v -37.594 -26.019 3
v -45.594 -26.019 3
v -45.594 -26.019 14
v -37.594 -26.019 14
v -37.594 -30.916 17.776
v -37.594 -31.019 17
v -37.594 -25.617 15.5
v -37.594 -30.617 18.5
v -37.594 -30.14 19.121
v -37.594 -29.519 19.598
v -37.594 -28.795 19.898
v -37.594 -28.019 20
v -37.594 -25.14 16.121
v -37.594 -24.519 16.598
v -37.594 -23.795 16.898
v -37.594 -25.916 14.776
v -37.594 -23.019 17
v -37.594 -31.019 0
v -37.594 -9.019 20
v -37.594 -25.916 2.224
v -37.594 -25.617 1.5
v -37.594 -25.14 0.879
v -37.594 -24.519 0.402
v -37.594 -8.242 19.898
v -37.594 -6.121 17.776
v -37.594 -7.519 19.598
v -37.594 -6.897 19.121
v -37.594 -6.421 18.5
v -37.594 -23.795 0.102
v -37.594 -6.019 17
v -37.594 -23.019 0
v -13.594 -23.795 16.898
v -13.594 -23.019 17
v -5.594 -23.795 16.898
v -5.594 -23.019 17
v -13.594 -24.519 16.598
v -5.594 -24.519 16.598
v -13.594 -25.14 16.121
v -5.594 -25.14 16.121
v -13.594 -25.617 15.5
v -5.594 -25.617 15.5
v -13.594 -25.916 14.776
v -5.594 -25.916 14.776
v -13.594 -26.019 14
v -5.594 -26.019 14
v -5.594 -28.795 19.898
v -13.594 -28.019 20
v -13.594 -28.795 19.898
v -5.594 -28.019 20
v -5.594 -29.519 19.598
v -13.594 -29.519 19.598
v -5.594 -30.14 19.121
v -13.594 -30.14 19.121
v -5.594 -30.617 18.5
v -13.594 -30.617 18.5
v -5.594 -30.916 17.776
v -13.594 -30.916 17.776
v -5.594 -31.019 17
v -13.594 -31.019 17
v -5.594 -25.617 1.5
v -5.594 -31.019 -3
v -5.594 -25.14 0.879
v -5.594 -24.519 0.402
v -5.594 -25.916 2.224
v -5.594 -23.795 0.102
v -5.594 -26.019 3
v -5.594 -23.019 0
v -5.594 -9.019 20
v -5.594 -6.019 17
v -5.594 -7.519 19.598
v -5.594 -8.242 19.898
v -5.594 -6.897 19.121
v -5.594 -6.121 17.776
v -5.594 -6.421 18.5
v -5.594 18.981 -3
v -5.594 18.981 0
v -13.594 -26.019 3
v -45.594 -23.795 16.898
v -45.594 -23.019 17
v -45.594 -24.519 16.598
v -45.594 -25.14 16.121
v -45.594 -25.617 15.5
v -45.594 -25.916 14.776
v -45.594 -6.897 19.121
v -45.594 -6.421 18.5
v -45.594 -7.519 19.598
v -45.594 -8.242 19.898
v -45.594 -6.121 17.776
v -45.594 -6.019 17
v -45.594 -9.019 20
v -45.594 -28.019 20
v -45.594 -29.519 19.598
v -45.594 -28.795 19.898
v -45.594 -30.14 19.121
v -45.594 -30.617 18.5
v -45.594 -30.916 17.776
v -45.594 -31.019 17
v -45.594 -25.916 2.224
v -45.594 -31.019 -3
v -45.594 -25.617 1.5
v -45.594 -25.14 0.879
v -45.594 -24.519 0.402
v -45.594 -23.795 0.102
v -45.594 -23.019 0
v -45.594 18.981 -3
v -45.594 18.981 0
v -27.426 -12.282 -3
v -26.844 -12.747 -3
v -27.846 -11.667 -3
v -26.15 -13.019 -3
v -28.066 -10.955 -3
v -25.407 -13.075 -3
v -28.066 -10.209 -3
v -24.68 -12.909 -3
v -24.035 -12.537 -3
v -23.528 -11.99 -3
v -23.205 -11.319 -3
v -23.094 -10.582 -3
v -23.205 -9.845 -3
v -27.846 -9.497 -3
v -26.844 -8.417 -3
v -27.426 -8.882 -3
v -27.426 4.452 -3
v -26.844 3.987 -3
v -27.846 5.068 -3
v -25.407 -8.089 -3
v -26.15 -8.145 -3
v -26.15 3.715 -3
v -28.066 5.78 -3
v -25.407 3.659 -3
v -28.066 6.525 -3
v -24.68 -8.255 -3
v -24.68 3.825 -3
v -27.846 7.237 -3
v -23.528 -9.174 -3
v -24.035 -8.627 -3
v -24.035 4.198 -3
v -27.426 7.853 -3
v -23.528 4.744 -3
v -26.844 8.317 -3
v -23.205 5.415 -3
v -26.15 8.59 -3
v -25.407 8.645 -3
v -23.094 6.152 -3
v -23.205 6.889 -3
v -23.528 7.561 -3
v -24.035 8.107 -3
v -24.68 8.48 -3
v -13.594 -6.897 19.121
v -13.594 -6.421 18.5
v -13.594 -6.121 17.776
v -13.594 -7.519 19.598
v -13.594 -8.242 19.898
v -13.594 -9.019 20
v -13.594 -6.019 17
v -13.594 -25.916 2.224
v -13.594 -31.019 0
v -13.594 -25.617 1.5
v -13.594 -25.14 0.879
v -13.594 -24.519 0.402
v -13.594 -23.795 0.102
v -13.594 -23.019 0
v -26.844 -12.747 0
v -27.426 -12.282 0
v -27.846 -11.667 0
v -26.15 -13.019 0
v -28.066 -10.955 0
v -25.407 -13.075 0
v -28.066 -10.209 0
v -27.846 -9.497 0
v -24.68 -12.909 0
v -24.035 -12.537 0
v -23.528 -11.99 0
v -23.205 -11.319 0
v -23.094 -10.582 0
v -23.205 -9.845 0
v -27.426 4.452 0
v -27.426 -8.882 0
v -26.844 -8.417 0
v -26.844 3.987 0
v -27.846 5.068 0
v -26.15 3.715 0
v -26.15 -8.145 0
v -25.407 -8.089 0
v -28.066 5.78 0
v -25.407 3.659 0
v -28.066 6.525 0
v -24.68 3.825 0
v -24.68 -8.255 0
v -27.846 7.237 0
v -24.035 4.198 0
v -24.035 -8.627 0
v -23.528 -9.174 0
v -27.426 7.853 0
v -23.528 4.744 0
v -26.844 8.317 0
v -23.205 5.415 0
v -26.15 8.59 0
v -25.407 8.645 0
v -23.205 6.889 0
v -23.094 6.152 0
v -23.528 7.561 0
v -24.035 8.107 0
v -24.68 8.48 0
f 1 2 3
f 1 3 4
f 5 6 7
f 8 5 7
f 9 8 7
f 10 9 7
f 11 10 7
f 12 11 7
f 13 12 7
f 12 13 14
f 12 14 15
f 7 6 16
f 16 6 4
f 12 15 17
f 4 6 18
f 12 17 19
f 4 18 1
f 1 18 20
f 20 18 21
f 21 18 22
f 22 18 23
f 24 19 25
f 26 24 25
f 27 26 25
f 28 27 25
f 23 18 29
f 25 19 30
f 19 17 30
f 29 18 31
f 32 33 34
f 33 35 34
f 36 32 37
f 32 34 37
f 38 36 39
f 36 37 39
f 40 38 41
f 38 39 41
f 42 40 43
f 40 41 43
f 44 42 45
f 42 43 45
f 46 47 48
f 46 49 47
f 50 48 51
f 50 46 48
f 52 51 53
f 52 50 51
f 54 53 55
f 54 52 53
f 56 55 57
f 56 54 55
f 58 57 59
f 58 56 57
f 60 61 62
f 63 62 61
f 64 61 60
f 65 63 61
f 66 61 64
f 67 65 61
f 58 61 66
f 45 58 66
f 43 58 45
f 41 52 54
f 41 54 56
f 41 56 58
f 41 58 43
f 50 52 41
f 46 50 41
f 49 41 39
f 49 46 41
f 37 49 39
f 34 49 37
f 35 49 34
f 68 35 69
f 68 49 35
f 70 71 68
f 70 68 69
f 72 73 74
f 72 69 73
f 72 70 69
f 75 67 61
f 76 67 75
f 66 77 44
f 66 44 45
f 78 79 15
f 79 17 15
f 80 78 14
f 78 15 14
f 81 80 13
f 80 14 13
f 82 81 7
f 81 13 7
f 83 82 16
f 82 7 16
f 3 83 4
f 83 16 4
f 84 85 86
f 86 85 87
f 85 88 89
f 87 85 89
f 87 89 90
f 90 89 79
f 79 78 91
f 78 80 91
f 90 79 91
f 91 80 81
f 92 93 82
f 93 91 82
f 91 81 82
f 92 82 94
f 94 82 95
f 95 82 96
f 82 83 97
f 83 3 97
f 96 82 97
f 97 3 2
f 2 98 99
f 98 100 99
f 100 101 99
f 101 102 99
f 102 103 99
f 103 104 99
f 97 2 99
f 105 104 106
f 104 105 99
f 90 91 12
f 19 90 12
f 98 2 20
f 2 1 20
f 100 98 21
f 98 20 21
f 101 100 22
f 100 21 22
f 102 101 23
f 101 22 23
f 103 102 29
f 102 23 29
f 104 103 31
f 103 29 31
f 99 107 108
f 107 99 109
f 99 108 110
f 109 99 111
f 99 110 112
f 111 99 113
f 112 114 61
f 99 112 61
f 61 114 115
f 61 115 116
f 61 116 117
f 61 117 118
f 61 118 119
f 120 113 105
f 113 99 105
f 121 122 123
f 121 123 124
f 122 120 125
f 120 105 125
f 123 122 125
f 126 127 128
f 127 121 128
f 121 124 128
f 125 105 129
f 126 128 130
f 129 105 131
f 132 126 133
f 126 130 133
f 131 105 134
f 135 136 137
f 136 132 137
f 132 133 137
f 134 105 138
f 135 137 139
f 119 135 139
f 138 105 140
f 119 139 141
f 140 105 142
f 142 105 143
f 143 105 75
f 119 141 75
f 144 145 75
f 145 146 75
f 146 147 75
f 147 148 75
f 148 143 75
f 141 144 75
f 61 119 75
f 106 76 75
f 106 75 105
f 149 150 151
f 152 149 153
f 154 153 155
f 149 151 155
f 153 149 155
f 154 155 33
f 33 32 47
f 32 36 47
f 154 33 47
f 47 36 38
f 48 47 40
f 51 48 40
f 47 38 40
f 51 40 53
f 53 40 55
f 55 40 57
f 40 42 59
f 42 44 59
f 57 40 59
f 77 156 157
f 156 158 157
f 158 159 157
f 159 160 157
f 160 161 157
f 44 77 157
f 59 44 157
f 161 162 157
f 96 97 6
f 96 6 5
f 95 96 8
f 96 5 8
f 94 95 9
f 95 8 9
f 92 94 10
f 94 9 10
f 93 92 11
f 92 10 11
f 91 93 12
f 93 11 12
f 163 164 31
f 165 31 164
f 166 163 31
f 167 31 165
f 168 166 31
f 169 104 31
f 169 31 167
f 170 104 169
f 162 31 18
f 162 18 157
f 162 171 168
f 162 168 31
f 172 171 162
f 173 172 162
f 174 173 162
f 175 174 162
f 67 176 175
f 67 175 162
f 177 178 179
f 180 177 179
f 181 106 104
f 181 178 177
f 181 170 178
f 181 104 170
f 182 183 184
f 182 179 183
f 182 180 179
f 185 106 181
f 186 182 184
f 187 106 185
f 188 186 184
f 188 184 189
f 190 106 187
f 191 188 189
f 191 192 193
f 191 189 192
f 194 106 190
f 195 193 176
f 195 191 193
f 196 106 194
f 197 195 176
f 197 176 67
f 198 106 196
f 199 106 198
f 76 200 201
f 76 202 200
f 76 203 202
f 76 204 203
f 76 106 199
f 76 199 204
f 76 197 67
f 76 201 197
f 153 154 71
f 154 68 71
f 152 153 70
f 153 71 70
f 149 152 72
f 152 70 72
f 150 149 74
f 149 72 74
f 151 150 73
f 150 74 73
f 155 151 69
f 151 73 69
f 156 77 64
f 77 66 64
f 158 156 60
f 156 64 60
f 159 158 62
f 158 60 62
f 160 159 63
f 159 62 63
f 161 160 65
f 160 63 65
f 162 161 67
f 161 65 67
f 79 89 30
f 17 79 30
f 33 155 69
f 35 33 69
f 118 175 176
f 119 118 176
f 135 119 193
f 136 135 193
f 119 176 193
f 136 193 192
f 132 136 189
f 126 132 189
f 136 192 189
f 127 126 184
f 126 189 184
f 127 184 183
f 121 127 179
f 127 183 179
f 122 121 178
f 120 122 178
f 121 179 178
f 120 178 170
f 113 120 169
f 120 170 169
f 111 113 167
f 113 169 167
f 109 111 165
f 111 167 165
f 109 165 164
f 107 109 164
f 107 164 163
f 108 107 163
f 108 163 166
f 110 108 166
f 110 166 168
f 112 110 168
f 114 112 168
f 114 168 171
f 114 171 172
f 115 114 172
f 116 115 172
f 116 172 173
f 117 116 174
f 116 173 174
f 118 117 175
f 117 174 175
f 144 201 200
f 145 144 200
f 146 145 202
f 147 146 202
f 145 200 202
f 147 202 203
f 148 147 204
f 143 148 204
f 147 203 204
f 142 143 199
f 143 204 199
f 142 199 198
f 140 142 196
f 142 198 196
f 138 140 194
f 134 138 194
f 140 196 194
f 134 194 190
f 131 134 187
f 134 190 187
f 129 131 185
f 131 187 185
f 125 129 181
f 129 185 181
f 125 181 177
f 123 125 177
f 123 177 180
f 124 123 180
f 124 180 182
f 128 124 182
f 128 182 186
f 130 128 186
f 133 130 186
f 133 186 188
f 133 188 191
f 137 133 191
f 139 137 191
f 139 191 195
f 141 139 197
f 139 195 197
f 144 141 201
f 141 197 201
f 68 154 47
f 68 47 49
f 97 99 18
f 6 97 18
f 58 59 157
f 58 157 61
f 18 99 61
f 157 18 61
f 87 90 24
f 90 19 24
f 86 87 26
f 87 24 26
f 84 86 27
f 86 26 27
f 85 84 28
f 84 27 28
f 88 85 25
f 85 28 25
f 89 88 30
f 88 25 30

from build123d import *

# Parameters (mm, degrees)
F0_R     = 2.5
F0_W     = 8
F0_H     = 20
F0_H_2   = 5
F0_W_2   = 24
F1_DEPTH = 3
F2_DEPTH = 20
F3_DEPTH = 17
F4_R     = 2.99999


# Not quite as in the source:
# - a fillet or chamfer is up to 0.001 mm smaller than in the source, because OpenCascade refuses the exact size


with BuildPart() as f1:
    # F0 (on Top) → F1 (new body)
    with BuildSketch(Plane.XY):
        Polygon((-5.5937515758, 18.9813033898), (-45.5937515758, 18.9813033898), (-45.5937515758, -6.0186966102), (-37.5937515758, -6.0186966102), (-37.5937515758, -26.0186966102), (-13.5937515758, -26.0186966102), (-13.5937515758, -6.0186966102), (-5.5937515758, -6.0186966102), align=None)
        with Locations((-25.5937515758, -10.5820312165)):
            Circle(F0_R, mode=Mode.SUBTRACT)
        with Locations((-25.5937515758, 6.1523453332)):
            Circle(F0_R, mode=Mode.SUBTRACT)
        with Locations((-41.5937515758, -16.0186966102)):
            Rectangle(F0_W, F0_H)
        with Locations((-41.5937515758, -28.5186966102)):
            Rectangle(F0_W, F0_H_2)
        with Locations((-25.5937515758, -28.5186966102)):
            Rectangle(F0_W_2, F0_H_2)
        with Locations((-9.5937515758, -28.5186966102)):
            Rectangle(F0_W, F0_H_2)
        with Locations((-9.5937515758, -16.0186966102)):
            Rectangle(F0_W, F0_H)
    extrude(amount=-F1_DEPTH)

    # F0 (on Top) → F2 (join)
    with BuildSketch(Plane.XY):
        with Locations((-41.5937515758, -16.0186966102)):
            Rectangle(F0_W, F0_H)
        with Locations((-9.5937515758, -16.0186966102)):
            Rectangle(F0_W, F0_H)
        with Locations((-9.5937515758, -28.5186966102)):
            Rectangle(F0_W, F0_H_2)
        with Locations((-41.5937515758, -28.5186966102)):
            Rectangle(F0_W, F0_H_2)
    extrude(amount=F2_DEPTH)

    # F0 (on Top) → F3 (cut)
    with BuildSketch(Plane.XY):
        with Locations((-41.5937515758, -16.0186966102)):
            Rectangle(F0_W, F0_H)
        with Locations((-9.5937515758, -16.0186966102)):
            Rectangle(F0_W, F0_H)
    extrude(amount=F3_DEPTH, mode=Mode.SUBTRACT)

    # F4 (radius 3 in the source; OpenCascade refuses exactly that, so slightly less here)
    f4_edges = [f1.edges().sort_by_distance(p)[0] for p in [
        (-41.593752, -31.018697, 20),
        (-9.593752, -31.018697, 20),
        (-41.593752, -6.018697, 20),
        (-9.593752, -6.018697, 20),
        (-41.593752, -26.018697, 17),
        (-9.593752, -26.018697, 17),
        (-9.593752, -26.018697, 0),
        (-41.593752, -26.018697, 0),
    ]]
    fillet(f4_edges, radius=F4_R)


solid = f1.part
